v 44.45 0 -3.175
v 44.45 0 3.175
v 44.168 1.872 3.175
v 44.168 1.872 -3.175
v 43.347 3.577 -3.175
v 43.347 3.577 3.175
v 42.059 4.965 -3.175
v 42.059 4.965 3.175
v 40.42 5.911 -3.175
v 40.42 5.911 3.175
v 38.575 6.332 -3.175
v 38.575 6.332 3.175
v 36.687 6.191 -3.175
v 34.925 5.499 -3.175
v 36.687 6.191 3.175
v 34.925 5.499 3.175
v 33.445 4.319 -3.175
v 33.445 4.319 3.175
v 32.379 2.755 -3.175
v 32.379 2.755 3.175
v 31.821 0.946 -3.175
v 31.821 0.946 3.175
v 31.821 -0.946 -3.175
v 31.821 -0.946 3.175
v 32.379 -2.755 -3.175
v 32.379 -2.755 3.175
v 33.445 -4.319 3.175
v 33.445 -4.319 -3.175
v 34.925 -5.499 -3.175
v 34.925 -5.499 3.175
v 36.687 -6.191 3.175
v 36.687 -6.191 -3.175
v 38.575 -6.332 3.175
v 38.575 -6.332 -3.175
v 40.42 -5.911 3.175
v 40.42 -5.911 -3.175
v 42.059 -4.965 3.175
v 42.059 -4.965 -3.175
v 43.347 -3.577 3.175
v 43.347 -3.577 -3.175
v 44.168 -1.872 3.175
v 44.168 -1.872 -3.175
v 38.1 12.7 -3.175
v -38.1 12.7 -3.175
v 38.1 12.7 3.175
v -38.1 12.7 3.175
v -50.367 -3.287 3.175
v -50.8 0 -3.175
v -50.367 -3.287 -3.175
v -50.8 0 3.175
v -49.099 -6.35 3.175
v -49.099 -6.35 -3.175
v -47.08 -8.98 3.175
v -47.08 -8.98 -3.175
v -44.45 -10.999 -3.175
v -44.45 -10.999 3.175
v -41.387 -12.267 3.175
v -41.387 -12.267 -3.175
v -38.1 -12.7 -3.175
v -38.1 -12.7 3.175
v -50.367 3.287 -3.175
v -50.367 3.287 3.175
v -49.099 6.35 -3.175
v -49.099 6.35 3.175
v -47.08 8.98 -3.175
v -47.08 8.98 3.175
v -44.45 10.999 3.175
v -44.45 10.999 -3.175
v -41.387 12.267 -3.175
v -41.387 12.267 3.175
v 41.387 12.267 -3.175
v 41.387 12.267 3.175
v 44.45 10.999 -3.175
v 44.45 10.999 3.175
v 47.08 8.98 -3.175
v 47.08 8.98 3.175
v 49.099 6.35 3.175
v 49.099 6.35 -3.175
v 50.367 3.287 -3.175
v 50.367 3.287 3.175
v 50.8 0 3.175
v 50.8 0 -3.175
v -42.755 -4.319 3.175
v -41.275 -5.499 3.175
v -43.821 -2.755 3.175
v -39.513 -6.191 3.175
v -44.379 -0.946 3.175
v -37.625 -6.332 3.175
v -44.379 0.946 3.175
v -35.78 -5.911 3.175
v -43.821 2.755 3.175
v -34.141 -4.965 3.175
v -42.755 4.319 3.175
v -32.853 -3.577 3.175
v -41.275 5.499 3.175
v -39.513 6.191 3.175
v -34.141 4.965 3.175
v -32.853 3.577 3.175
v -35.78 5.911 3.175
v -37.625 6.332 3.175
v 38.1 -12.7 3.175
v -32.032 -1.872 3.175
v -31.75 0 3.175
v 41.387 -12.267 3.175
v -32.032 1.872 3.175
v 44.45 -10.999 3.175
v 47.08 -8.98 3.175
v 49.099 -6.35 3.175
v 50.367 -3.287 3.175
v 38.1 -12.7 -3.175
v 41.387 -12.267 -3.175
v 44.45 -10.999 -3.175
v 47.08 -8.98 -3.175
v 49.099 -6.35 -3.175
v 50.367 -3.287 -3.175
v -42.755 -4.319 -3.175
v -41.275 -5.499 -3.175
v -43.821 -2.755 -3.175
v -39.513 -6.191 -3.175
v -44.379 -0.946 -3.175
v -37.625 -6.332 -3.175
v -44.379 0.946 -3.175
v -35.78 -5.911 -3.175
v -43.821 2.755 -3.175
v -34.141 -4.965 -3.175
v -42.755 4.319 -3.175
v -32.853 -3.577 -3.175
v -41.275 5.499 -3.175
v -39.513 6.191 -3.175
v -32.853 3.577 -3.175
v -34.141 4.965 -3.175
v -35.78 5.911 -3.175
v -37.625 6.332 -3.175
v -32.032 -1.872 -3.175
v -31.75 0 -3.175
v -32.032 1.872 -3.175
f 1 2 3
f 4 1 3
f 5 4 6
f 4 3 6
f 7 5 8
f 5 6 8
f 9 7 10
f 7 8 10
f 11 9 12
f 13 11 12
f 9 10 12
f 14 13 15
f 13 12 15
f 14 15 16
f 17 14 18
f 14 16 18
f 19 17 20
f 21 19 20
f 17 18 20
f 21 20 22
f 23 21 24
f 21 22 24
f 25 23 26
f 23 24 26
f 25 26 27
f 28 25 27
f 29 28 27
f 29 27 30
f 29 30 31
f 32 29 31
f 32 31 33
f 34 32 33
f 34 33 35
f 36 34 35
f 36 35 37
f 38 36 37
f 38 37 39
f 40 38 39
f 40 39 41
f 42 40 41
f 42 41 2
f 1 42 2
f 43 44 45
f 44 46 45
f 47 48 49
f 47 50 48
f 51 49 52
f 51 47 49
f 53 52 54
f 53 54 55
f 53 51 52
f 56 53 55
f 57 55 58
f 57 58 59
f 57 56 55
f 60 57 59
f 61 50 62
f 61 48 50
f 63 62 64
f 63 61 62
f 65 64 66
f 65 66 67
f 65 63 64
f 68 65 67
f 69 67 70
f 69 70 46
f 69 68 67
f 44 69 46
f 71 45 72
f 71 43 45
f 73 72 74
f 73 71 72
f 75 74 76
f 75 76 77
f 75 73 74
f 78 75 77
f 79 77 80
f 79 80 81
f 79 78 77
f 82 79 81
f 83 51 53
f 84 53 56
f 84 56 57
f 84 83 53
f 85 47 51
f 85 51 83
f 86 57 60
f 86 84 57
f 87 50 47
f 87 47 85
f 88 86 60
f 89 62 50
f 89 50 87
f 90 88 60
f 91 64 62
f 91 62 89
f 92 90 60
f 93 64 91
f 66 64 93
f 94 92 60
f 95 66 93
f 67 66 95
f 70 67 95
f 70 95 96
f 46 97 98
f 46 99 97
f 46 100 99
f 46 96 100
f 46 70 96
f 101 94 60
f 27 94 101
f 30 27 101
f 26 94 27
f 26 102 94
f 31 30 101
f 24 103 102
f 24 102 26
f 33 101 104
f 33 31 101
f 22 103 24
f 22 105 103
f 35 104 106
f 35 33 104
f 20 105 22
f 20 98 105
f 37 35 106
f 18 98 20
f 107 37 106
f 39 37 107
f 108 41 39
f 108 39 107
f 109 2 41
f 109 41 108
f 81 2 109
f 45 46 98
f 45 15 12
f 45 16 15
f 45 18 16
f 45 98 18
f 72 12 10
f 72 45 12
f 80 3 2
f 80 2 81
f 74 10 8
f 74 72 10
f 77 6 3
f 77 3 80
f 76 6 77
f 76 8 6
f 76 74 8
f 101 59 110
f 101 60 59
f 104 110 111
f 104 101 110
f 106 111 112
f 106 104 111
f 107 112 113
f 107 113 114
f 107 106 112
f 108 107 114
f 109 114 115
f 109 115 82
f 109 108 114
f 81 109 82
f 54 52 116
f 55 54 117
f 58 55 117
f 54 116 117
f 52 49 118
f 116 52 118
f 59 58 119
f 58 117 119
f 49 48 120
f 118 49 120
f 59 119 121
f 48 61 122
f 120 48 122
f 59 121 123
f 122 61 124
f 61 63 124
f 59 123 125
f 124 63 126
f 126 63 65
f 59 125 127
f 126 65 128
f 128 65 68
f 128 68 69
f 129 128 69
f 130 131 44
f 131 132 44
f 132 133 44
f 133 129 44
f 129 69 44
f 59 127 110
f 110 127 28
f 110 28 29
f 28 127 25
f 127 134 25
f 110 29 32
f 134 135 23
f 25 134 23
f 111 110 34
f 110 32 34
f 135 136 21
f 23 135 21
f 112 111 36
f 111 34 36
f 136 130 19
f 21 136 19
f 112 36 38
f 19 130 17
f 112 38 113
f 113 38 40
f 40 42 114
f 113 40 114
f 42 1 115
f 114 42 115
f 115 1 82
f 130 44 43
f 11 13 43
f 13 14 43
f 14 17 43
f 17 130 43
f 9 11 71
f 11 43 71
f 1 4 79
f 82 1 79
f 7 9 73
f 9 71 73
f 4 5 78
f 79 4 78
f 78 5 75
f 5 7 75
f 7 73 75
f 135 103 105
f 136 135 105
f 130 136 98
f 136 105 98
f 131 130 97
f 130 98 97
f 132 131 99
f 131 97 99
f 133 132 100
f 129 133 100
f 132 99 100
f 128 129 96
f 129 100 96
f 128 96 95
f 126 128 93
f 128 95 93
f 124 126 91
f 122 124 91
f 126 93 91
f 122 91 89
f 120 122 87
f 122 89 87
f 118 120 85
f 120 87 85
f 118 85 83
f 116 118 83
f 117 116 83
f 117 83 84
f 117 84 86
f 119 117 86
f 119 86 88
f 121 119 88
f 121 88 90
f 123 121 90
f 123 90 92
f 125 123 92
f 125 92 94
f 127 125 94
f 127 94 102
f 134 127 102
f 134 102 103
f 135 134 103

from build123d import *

# Parameters (mm, degrees)
F0_W          = 101.6
F0_H          = 25.4
F1_DEPTH      = 3.175
F1_DEPTH_BACK = 3.175
F2_R          = 6.35
F3_DEPTH      = 6.351
F4_DEPTH      = 6.351
F5_R          = 12.69999


# Not quite as in the source:
# - a fillet or chamfer is up to 0.001 mm smaller than in the source, because OpenCascade refuses the exact size


with BuildPart() as f1:
    # F0 (on Top) → F1 (new body, two sides)
    with BuildSketch(Plane.XY) as f1_sk:
        Rectangle(F0_W, F0_H)
    extrude(amount=F1_DEPTH)
    extrude(f1_sk.sketch, amount=-F1_DEPTH_BACK)

    # F2 (on face) → F3 (cut, through all)
    with BuildSketch(Plane.XY.offset(3.175)):
        with Locations((38.1, 0)):
            Circle(F2_R)
        with Locations((-38.1, 0)):
            Circle(F2_R)
    extrude(amount=-F3_DEPTH, mode=Mode.SUBTRACT)

    # F2 (on face) → F4 (cut, through all)
    with BuildSketch(Plane.XY.offset(3.175)):
        with Locations((38.1, 0)):
            Circle(F2_R)
        with Locations((-38.1, 0)):
            Circle(F2_R)
    extrude(amount=-F4_DEPTH, mode=Mode.SUBTRACT)

    # F5 (radius 12.7 in the source; OpenCascade refuses exactly that, so slightly less here)
    f5_edges = [f1.edges().sort_by_distance(p)[0] for p in [
        (50.8, -12.7, 0),
        (-50.8, -12.7, 0),
        (50.8, 12.7, 0),
        (-50.8, 12.7, 0),
    ]]
    fillet(f5_edges, radius=F5_R)


solid = f1.part
